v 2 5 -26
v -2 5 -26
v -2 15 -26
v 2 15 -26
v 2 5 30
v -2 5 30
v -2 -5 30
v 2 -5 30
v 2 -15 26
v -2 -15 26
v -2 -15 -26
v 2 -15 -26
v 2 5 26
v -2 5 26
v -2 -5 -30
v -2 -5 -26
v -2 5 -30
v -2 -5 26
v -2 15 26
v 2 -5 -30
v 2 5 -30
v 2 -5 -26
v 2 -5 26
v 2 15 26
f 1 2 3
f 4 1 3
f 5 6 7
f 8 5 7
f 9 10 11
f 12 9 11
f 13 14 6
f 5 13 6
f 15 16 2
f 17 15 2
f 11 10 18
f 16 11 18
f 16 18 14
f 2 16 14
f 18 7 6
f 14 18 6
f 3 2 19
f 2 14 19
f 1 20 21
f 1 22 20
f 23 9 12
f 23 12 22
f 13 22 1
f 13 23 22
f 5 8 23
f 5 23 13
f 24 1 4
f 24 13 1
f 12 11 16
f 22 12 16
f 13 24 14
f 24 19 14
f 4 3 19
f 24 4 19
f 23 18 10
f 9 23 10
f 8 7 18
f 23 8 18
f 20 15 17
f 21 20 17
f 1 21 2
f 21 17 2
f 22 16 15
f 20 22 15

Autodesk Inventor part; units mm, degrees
ref_plane "YZ Plane" through (0, 0, 0) normal (1, 0, 0) x (0, 1, 0)
ref_plane "XZ Plane" through (0, 0, 0) normal (0, 1, 0) x (-1, 0, 0)
ref_plane "XY Plane" through (0, 0, 0) normal (0, 0, 1) x (1, 0, 0)
sketch "Эскиз1" plane through (0, 0, 0) normal (1, 0, 0) x (0, 1, 0)
  line L0 (0, -42) -> (0, 42) construction
  line L1 (-15, -26) -> (15, -26)
  line L2 (15, -26) -> (15, 26)
  line L3 (15, 26) -> (-15, 26)
  line L4 (-15, 26) -> (-15, -26)
  line L5 (-15, -26) -> (15, 26) construction
  line L6 (15, -26) -> (-15, 26) construction
  line L7 (5, 30) -> (-5, 30)
  line L8 (-5, 30) -> (-5, 26)
  line L9 (-5, 26) -> (5, 26)
  line L10 (5, 26) -> (5, 30)
  line L11 (5, -26) -> (-5, -26)
  line L12 (-5, -26) -> (-5, -30)
  line L13 (-5, -30) -> (5, -30)
  line L14 (5, -30) -> (5, -26)
  point P0 (0, 0)
  dimension "d3" = 30
  dimension "d4" = 60
  dimension "d5" = 4
  dimension "d6" = 10
extrude "Выдавливание1" add sketch "Эскиз1" along normal mid plane 4
properties part number "Кусочек барабана на 3 см"
